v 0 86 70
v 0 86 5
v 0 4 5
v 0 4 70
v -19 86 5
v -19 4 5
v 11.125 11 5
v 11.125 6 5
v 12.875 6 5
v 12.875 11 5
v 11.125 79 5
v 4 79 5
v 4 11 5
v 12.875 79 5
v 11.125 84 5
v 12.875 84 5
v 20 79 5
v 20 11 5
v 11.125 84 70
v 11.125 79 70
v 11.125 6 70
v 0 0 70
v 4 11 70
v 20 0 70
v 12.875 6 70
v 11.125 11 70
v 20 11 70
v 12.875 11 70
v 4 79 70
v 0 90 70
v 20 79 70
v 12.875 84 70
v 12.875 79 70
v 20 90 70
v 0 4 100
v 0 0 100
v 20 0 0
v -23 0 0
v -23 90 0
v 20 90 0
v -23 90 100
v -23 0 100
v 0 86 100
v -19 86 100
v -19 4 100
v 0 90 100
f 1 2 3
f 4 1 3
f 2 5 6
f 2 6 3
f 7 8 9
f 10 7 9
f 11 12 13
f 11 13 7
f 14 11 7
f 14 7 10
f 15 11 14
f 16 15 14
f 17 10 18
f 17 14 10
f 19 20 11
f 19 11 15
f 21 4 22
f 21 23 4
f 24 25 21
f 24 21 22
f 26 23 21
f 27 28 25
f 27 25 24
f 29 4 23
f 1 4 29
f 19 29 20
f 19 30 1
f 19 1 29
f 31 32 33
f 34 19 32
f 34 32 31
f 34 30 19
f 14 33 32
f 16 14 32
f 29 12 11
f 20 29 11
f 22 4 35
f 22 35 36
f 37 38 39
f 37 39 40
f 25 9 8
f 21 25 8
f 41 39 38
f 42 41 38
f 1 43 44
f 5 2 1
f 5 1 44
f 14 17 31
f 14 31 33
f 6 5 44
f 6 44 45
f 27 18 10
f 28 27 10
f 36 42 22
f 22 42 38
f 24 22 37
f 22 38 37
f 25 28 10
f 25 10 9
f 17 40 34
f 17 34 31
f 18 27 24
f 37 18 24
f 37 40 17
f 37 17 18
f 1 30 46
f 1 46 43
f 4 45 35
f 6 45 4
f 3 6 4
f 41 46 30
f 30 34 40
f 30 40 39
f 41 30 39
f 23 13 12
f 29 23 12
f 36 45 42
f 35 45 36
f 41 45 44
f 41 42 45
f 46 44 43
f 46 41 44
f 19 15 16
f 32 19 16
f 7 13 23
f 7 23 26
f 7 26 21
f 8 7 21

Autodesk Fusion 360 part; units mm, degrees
sketch "Sketch1" plane through (0, 0, 0) normal (0, 0, 1) x (1, 0, 0)
  line L0 (0, 0) -> (20, 0)
  line L1 (20, 90) -> (0, 90)
  line L2 (0, 90) -> (0, 0)
  line L3 (4, 79) -> (11.125, 79)
  line L4 (11.125, 79) -> (11.125, 84)
  line L5 (4, 11) -> (4, 79)
  line L6 (0, 75) -> (0, 25)
  line L7 (20, 90) -> (0, 0) construction
  line L8 (0, 90) -> (20, 0) construction
  line L9 (0, 90) -> (-23, 90)
  line L10 (-23, 90) -> (-23, 0)
  line L11 (-23, 0) -> (0, 0)
  line L12 (0, 0) -> (0, 90)
  line L13 (0, 90) -> (-23, 0) construction
  line L14 (-23, 90) -> (0, 0) construction
  line L15 (10, 45) -> (-11.5, 45) construction
  line L16 (0, 86) -> (-19, 86)
  line L17 (-19, 86) -> (-19, 4)
  line L18 (-19, 4) -> (0, 4)
  line L19 (12, 90) -> (12, 0) construction
  line L20 (11.125, 84) -> (12, 84)
  line L21 (20, 79) -> (12.875, 79)
  line L22 (12.875, 79) -> (12.875, 84)
  line L23 (12.875, 84) -> (12, 84)
  line L24 (20, 90) -> (20, 0)
  line L25 (20, 11) -> (12.875, 11)
  line L26 (4, 11) -> (11.125, 11)
  line L27 (11.125, 11) -> (11.125, 6)
  line L28 (11.125, 6) -> (12, 6)
  line L29 (12.875, 6) -> (12, 6)
  line L30 (12.875, 11) -> (12.875, 6)
  point P0 (-11.5, 45)
  dimension "d37" = 90
  dimension "d38" = 23
  dimension "d39" = -4
  dimension "d51" = 12
  dimension "d57" = 1.75
  dimension "d63" = 5
  dimension "d65" = 78
  dimension "d66" = 6
  dimension "d67" = 20
  dimension "d72" = 8
extrude "Extrude7" add sketch "Sketch1" along normal blind 5 contours L2 L6 L12 L16 L17 L18 | L3 L4 L5 L20 L21 L22 L23 L24 L25 L26 L27 L28 L29 L30 makes body 1 at (6.375, 33.6667, 0) makes body 2 at (-6.3333, 58.6667, 0)
extrude "Extrude9" add sketch "Sketch1" along normal blind 70 contours L0 L1 L2 L3 L4 L5 L6 L12 L20 L21 L22 L23 L24 L25 L26 L27 L28 L29 L30 bodies 1 2
extrude "Extrude10" add sketch "Sketch1" along normal blind 100 contours L2 L9 L10 L11 L12 L16 L17 L18 bodies 1
